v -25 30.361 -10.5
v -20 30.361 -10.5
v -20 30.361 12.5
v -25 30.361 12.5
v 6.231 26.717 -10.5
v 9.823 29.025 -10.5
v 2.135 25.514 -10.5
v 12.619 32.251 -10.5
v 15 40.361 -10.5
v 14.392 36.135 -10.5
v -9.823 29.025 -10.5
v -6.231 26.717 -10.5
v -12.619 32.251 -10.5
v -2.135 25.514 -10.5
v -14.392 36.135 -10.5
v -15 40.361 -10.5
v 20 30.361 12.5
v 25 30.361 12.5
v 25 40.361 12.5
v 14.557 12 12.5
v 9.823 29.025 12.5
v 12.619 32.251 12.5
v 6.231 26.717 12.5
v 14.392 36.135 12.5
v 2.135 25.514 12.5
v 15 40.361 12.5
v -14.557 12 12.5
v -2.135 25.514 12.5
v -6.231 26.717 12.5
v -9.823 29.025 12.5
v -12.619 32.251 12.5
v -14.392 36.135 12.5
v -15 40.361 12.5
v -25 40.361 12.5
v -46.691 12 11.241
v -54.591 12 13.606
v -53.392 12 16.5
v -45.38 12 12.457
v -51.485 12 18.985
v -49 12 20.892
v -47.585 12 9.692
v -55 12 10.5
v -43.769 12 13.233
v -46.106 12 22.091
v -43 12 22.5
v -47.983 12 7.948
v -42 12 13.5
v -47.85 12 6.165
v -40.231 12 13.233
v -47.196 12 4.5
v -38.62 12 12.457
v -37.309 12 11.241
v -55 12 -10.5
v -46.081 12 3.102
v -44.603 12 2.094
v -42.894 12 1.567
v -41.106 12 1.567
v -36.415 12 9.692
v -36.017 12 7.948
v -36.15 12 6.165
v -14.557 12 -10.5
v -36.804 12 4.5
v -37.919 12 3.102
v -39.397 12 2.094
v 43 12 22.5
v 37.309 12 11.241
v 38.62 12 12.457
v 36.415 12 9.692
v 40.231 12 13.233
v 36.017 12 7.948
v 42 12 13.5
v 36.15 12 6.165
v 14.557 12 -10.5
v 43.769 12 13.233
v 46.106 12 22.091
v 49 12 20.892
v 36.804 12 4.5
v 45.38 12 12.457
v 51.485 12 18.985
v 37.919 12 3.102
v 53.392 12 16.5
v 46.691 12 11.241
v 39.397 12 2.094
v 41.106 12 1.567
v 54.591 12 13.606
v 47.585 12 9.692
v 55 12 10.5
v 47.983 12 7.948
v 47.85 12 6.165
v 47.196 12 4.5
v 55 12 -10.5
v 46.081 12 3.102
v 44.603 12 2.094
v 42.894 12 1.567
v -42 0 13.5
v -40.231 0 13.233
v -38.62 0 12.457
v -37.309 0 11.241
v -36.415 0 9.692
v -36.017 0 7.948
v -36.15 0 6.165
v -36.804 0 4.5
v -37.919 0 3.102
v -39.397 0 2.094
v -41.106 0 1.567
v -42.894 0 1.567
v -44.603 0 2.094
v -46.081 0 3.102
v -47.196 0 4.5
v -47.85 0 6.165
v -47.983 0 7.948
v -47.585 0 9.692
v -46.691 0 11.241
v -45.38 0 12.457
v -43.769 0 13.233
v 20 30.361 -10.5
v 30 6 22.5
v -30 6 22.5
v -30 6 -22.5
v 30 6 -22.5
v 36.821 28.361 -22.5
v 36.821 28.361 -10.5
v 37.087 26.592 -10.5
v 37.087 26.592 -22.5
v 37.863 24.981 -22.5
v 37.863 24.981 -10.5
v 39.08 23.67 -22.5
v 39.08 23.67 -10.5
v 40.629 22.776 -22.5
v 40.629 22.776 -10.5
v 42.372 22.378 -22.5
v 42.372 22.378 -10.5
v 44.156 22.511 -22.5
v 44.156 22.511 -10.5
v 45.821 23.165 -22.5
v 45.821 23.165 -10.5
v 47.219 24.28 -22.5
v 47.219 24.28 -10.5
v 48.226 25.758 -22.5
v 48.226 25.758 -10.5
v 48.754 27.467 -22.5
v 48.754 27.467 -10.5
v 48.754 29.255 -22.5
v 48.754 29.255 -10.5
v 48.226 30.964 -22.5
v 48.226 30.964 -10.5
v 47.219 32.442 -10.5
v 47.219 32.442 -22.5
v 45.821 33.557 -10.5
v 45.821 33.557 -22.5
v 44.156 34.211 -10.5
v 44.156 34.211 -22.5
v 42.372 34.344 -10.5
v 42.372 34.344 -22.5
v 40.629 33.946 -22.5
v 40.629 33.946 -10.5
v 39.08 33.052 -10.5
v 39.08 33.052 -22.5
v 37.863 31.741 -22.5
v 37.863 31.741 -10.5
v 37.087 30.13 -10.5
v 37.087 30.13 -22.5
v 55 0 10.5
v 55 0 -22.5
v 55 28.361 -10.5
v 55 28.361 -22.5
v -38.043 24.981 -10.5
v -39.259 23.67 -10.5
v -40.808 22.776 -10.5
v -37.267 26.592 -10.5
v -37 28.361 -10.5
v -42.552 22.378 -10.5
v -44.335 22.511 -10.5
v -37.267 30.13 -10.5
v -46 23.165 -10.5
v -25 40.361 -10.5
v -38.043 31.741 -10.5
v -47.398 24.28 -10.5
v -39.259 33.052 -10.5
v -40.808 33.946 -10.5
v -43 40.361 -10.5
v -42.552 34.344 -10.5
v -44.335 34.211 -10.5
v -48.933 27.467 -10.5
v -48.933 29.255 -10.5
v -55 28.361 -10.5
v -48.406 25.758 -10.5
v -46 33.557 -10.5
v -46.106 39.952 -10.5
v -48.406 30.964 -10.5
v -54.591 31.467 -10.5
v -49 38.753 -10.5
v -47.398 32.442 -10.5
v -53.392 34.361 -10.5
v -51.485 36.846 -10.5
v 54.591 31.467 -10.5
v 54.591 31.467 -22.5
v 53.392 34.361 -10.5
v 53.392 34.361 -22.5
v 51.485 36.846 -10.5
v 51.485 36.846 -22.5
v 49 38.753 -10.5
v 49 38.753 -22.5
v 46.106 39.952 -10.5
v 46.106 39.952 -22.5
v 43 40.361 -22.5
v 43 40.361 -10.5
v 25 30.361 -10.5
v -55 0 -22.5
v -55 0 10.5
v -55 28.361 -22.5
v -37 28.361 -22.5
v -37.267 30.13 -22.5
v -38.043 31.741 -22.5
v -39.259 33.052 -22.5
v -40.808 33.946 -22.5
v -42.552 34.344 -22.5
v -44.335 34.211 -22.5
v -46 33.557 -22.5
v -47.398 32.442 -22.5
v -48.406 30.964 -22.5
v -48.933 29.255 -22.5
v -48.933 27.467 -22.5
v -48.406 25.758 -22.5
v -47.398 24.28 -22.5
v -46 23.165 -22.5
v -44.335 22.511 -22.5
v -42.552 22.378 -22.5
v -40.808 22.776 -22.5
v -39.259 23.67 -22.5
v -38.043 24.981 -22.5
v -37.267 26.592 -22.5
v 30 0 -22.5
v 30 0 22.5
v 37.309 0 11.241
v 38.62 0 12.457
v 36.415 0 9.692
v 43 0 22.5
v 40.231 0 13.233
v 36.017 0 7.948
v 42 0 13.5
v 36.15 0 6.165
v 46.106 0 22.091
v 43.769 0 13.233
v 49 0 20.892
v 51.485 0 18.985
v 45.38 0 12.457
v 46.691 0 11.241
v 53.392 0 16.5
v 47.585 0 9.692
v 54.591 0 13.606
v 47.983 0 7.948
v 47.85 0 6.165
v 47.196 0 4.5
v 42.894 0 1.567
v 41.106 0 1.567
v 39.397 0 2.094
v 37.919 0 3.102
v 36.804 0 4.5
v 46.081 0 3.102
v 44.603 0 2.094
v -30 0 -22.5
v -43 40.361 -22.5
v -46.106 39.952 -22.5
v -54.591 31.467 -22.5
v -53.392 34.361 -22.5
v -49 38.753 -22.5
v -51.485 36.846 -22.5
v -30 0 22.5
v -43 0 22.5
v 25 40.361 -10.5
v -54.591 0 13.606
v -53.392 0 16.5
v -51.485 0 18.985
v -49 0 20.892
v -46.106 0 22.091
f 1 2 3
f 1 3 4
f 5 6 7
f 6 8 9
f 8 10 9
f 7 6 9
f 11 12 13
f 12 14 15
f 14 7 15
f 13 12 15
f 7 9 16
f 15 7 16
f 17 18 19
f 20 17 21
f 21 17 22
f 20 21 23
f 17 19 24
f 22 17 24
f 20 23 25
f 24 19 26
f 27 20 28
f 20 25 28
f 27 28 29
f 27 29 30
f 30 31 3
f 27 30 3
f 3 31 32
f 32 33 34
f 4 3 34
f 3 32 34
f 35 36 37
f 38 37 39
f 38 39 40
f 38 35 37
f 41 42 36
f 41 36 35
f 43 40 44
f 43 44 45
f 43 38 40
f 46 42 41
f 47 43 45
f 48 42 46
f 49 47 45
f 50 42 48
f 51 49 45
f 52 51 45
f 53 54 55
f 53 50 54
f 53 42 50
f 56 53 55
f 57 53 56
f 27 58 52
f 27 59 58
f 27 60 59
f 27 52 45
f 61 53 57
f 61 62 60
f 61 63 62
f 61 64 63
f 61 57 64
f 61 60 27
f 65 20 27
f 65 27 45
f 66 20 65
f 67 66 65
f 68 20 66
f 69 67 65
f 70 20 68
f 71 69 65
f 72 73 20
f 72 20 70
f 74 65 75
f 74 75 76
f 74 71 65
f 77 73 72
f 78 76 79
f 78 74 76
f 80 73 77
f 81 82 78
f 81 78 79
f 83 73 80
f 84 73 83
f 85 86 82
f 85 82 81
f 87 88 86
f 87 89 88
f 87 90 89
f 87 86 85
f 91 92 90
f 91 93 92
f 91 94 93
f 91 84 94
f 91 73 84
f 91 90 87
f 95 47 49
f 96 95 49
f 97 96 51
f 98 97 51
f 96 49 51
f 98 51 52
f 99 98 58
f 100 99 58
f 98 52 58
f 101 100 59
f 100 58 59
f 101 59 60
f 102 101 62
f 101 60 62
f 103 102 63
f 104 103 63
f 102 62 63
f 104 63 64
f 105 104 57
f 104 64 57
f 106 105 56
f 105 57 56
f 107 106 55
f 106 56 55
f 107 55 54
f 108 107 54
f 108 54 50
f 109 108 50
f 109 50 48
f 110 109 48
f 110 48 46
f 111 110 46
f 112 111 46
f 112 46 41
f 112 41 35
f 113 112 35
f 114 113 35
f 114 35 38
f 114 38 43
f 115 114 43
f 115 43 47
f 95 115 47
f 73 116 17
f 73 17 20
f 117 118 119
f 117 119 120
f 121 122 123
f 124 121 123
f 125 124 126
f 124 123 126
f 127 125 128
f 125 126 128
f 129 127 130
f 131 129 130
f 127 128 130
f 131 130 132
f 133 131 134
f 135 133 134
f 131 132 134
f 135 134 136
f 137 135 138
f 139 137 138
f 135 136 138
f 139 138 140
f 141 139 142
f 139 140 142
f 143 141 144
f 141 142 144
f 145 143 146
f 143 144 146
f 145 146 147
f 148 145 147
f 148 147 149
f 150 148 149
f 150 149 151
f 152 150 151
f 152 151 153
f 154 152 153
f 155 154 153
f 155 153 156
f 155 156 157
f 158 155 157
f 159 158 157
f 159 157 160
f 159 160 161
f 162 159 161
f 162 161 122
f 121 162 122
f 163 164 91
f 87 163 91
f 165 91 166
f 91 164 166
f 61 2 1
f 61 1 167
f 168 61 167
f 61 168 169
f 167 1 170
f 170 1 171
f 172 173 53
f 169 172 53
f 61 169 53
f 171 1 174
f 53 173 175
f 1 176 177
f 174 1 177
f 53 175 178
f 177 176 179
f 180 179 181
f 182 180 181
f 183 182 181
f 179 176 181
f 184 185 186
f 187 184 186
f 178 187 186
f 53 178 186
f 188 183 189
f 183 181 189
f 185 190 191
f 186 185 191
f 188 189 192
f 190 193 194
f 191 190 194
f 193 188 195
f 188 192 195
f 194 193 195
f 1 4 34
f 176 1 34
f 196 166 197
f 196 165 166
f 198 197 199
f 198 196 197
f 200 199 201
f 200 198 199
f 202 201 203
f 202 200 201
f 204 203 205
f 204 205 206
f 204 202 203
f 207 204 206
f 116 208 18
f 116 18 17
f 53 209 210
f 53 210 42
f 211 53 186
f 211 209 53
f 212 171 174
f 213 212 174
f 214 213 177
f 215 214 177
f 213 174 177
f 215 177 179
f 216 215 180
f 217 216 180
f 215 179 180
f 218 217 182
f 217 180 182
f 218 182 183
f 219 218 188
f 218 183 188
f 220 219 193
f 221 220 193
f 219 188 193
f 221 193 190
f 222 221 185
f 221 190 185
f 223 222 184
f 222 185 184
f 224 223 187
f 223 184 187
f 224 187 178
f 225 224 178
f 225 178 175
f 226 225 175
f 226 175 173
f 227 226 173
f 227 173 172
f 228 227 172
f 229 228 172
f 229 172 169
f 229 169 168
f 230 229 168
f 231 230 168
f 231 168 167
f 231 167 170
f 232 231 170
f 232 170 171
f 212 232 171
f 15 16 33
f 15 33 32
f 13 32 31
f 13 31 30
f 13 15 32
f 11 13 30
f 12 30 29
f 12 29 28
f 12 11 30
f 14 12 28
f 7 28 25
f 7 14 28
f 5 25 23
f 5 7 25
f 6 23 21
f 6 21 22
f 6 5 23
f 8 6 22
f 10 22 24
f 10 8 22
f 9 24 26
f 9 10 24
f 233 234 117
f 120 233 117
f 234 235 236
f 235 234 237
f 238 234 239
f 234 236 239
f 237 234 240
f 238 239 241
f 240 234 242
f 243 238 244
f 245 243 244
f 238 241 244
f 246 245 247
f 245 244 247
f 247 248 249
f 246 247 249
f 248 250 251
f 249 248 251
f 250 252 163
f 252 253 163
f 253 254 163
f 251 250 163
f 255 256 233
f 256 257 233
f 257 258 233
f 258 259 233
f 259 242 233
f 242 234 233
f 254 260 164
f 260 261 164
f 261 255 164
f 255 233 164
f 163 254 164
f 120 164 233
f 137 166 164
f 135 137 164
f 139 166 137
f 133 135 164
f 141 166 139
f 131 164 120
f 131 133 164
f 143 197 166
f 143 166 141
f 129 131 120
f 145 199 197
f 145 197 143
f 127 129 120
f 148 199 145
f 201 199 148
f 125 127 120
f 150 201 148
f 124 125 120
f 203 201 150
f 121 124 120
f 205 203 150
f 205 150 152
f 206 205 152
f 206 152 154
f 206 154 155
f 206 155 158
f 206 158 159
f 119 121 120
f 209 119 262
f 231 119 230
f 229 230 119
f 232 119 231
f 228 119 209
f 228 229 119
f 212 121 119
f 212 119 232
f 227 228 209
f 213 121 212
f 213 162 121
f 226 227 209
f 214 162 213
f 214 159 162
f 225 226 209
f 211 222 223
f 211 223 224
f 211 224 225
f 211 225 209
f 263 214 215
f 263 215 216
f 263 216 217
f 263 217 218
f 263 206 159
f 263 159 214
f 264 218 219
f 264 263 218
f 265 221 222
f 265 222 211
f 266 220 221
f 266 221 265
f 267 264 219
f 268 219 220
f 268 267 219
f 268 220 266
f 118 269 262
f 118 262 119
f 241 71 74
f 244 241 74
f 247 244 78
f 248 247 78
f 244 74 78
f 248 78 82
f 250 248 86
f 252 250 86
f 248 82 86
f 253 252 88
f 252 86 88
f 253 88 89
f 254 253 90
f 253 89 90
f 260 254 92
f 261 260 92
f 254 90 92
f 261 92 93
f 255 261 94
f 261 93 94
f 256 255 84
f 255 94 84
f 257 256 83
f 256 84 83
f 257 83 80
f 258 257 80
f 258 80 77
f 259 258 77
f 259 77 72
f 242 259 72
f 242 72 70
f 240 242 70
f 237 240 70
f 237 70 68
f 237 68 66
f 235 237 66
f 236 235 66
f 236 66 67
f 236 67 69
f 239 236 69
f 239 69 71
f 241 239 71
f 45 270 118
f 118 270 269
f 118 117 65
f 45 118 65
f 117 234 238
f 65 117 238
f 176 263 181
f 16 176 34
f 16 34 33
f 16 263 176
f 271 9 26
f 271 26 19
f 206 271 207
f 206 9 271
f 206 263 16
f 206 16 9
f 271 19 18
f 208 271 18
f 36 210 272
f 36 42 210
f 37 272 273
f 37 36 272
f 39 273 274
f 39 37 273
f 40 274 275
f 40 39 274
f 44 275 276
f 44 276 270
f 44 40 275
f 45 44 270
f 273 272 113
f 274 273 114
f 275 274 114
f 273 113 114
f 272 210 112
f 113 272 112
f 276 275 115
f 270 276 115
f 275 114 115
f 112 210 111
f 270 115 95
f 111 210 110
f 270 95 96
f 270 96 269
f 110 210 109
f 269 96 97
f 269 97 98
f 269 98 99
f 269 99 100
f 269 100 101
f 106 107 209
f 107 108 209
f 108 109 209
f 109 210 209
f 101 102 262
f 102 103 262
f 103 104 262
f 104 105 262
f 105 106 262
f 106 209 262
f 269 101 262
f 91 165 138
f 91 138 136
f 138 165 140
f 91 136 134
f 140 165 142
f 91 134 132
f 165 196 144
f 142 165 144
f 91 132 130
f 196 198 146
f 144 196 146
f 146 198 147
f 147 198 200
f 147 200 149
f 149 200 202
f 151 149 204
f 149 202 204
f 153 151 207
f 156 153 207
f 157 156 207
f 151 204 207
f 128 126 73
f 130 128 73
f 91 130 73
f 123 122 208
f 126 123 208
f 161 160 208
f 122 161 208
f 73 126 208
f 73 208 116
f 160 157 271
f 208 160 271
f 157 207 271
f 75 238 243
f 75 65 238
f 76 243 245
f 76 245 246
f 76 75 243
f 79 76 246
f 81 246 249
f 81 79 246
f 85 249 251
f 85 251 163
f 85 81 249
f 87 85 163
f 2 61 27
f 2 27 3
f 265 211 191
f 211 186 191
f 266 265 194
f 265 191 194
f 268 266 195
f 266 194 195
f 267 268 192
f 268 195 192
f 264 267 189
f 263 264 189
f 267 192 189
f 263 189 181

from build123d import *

# Parameters (mm, degrees)
SKETCH1_W           = 110
SKETCH1_H           = 45
BOSS_EXTRUDE1_DEPTH = 12
FILLET1_R           = 12
SKETCH2_W           = 110
SKETCH2_H           = 28.361012769
BOSS_EXTRUDE2_DEPTH = 12
FILLET2_R           = 12
BOSS_EXTRUDE3_DEPTH = 23
SKETCH4_R           = 6
CUT_EXTRUDE1_DEPTH  = 66.845250742
SKETCH5_R           = 6
CUT_EXTRUDE2_DEPTH  = 76.782658648
SKETCH6_W           = 60
SKETCH6_H           = 6
CUT_EXTRUDE3_DEPTH  = 82.725218579


with BuildPart() as part:
    # Sketch1 → Boss-Extrude1 (new body)
    with BuildSketch(Plane(origin=(0, 0, 0), x_dir=(1, 0, 0), z_dir=(0, 1, 0))):
        Rectangle(SKETCH1_W, SKETCH1_H)
    extrude(amount=BOSS_EXTRUDE1_DEPTH)

    # Fillet1
    fillet1_edges = [part.edges().sort_by_distance(p)[0] for p in [
        (55, 6, 22.5),
        (-55, 6, 22.5),
    ]]
    fillet(fillet1_edges, radius=FILLET1_R)

    # Sketch2 → Boss-Extrude2 (add)
    with BuildSketch(Plane(origin=(0, 0, -22.5), x_dir=(-1, 0, 0), z_dir=(0, 0, -1))):
        with Locations((0, 26.180506385)):
            Rectangle(SKETCH2_W, SKETCH2_H)
    extrude(amount=-BOSS_EXTRUDE2_DEPTH)

    # Fillet2
    fillet2_edges = [part.edges().sort_by_distance(p)[0] for p in [
        (55, 40.361012769, -16.5),
        (-55, 40.361012769, -16.5),
    ]]
    fillet(fillet2_edges, radius=FILLET2_R)

    # Sketch3 → Boss-Extrude3 (add)
    with BuildSketch(Plane.XY.offset(-10.5)):
        with BuildLine():
            Line((15, 40.361012769), (25, 40.361012769))
            Line((25, 40.361012769), (25, 30.361012769))
            Line((25, 30.361012769), (20, 30.361012769))
            Line((20, 30.361012769), (11, 0))
            Line((11, 0), (-11, 0))
            Line((-11, 0), (-20, 30.361012769))
            Line((-20, 30.361012769), (-25, 30.361012769))
            Line((-25, 30.361012769), (-25, 40.361012769))
            Line((-25, 40.361012769), (-15, 40.361012769))
            ThreePointArc((-15, 40.361012769), (0, 25.361012769), (15, 40.361012769))
        make_face()
    extrude(amount=BOSS_EXTRUDE3_DEPTH)

    # Sketch4 → Cut-Extrude1 (cut, through all)
    with BuildSketch(Plane(origin=(0, 12, 0), x_dir=(1, 0, 0), z_dir=(0, 1, 0))):
        with Locations(Location((-42, -7.5, 0), (0, 0, 270))):
            Circle(SKETCH4_R)
        with Locations(Location((42, -7.5, 0), (0, 0, 270))):
            Circle(SKETCH4_R)
    extrude(amount=-CUT_EXTRUDE1_DEPTH, mode=Mode.SUBTRACT)

    # Sketch5 → Cut-Extrude2 (cut, through all)
    with BuildSketch(Plane.XY.offset(-10.5)):
        with Locations((-43, 28.361012769)):
            Circle(SKETCH5_R)
        with Locations(Location((42.820569124, 28.361012769, 0), (0, 0, 180))):
            Circle(SKETCH5_R)
    extrude(amount=-CUT_EXTRUDE2_DEPTH, mode=Mode.SUBTRACT)

    # Sketch6 → Cut-Extrude3 (cut, through all)
    with BuildSketch(Plane.XY.offset(22.5)):
        with Locations((0, 3)):
            Rectangle(SKETCH6_W, SKETCH6_H)
    extrude(amount=-CUT_EXTRUDE3_DEPTH, mode=Mode.SUBTRACT)


solid = part.part
